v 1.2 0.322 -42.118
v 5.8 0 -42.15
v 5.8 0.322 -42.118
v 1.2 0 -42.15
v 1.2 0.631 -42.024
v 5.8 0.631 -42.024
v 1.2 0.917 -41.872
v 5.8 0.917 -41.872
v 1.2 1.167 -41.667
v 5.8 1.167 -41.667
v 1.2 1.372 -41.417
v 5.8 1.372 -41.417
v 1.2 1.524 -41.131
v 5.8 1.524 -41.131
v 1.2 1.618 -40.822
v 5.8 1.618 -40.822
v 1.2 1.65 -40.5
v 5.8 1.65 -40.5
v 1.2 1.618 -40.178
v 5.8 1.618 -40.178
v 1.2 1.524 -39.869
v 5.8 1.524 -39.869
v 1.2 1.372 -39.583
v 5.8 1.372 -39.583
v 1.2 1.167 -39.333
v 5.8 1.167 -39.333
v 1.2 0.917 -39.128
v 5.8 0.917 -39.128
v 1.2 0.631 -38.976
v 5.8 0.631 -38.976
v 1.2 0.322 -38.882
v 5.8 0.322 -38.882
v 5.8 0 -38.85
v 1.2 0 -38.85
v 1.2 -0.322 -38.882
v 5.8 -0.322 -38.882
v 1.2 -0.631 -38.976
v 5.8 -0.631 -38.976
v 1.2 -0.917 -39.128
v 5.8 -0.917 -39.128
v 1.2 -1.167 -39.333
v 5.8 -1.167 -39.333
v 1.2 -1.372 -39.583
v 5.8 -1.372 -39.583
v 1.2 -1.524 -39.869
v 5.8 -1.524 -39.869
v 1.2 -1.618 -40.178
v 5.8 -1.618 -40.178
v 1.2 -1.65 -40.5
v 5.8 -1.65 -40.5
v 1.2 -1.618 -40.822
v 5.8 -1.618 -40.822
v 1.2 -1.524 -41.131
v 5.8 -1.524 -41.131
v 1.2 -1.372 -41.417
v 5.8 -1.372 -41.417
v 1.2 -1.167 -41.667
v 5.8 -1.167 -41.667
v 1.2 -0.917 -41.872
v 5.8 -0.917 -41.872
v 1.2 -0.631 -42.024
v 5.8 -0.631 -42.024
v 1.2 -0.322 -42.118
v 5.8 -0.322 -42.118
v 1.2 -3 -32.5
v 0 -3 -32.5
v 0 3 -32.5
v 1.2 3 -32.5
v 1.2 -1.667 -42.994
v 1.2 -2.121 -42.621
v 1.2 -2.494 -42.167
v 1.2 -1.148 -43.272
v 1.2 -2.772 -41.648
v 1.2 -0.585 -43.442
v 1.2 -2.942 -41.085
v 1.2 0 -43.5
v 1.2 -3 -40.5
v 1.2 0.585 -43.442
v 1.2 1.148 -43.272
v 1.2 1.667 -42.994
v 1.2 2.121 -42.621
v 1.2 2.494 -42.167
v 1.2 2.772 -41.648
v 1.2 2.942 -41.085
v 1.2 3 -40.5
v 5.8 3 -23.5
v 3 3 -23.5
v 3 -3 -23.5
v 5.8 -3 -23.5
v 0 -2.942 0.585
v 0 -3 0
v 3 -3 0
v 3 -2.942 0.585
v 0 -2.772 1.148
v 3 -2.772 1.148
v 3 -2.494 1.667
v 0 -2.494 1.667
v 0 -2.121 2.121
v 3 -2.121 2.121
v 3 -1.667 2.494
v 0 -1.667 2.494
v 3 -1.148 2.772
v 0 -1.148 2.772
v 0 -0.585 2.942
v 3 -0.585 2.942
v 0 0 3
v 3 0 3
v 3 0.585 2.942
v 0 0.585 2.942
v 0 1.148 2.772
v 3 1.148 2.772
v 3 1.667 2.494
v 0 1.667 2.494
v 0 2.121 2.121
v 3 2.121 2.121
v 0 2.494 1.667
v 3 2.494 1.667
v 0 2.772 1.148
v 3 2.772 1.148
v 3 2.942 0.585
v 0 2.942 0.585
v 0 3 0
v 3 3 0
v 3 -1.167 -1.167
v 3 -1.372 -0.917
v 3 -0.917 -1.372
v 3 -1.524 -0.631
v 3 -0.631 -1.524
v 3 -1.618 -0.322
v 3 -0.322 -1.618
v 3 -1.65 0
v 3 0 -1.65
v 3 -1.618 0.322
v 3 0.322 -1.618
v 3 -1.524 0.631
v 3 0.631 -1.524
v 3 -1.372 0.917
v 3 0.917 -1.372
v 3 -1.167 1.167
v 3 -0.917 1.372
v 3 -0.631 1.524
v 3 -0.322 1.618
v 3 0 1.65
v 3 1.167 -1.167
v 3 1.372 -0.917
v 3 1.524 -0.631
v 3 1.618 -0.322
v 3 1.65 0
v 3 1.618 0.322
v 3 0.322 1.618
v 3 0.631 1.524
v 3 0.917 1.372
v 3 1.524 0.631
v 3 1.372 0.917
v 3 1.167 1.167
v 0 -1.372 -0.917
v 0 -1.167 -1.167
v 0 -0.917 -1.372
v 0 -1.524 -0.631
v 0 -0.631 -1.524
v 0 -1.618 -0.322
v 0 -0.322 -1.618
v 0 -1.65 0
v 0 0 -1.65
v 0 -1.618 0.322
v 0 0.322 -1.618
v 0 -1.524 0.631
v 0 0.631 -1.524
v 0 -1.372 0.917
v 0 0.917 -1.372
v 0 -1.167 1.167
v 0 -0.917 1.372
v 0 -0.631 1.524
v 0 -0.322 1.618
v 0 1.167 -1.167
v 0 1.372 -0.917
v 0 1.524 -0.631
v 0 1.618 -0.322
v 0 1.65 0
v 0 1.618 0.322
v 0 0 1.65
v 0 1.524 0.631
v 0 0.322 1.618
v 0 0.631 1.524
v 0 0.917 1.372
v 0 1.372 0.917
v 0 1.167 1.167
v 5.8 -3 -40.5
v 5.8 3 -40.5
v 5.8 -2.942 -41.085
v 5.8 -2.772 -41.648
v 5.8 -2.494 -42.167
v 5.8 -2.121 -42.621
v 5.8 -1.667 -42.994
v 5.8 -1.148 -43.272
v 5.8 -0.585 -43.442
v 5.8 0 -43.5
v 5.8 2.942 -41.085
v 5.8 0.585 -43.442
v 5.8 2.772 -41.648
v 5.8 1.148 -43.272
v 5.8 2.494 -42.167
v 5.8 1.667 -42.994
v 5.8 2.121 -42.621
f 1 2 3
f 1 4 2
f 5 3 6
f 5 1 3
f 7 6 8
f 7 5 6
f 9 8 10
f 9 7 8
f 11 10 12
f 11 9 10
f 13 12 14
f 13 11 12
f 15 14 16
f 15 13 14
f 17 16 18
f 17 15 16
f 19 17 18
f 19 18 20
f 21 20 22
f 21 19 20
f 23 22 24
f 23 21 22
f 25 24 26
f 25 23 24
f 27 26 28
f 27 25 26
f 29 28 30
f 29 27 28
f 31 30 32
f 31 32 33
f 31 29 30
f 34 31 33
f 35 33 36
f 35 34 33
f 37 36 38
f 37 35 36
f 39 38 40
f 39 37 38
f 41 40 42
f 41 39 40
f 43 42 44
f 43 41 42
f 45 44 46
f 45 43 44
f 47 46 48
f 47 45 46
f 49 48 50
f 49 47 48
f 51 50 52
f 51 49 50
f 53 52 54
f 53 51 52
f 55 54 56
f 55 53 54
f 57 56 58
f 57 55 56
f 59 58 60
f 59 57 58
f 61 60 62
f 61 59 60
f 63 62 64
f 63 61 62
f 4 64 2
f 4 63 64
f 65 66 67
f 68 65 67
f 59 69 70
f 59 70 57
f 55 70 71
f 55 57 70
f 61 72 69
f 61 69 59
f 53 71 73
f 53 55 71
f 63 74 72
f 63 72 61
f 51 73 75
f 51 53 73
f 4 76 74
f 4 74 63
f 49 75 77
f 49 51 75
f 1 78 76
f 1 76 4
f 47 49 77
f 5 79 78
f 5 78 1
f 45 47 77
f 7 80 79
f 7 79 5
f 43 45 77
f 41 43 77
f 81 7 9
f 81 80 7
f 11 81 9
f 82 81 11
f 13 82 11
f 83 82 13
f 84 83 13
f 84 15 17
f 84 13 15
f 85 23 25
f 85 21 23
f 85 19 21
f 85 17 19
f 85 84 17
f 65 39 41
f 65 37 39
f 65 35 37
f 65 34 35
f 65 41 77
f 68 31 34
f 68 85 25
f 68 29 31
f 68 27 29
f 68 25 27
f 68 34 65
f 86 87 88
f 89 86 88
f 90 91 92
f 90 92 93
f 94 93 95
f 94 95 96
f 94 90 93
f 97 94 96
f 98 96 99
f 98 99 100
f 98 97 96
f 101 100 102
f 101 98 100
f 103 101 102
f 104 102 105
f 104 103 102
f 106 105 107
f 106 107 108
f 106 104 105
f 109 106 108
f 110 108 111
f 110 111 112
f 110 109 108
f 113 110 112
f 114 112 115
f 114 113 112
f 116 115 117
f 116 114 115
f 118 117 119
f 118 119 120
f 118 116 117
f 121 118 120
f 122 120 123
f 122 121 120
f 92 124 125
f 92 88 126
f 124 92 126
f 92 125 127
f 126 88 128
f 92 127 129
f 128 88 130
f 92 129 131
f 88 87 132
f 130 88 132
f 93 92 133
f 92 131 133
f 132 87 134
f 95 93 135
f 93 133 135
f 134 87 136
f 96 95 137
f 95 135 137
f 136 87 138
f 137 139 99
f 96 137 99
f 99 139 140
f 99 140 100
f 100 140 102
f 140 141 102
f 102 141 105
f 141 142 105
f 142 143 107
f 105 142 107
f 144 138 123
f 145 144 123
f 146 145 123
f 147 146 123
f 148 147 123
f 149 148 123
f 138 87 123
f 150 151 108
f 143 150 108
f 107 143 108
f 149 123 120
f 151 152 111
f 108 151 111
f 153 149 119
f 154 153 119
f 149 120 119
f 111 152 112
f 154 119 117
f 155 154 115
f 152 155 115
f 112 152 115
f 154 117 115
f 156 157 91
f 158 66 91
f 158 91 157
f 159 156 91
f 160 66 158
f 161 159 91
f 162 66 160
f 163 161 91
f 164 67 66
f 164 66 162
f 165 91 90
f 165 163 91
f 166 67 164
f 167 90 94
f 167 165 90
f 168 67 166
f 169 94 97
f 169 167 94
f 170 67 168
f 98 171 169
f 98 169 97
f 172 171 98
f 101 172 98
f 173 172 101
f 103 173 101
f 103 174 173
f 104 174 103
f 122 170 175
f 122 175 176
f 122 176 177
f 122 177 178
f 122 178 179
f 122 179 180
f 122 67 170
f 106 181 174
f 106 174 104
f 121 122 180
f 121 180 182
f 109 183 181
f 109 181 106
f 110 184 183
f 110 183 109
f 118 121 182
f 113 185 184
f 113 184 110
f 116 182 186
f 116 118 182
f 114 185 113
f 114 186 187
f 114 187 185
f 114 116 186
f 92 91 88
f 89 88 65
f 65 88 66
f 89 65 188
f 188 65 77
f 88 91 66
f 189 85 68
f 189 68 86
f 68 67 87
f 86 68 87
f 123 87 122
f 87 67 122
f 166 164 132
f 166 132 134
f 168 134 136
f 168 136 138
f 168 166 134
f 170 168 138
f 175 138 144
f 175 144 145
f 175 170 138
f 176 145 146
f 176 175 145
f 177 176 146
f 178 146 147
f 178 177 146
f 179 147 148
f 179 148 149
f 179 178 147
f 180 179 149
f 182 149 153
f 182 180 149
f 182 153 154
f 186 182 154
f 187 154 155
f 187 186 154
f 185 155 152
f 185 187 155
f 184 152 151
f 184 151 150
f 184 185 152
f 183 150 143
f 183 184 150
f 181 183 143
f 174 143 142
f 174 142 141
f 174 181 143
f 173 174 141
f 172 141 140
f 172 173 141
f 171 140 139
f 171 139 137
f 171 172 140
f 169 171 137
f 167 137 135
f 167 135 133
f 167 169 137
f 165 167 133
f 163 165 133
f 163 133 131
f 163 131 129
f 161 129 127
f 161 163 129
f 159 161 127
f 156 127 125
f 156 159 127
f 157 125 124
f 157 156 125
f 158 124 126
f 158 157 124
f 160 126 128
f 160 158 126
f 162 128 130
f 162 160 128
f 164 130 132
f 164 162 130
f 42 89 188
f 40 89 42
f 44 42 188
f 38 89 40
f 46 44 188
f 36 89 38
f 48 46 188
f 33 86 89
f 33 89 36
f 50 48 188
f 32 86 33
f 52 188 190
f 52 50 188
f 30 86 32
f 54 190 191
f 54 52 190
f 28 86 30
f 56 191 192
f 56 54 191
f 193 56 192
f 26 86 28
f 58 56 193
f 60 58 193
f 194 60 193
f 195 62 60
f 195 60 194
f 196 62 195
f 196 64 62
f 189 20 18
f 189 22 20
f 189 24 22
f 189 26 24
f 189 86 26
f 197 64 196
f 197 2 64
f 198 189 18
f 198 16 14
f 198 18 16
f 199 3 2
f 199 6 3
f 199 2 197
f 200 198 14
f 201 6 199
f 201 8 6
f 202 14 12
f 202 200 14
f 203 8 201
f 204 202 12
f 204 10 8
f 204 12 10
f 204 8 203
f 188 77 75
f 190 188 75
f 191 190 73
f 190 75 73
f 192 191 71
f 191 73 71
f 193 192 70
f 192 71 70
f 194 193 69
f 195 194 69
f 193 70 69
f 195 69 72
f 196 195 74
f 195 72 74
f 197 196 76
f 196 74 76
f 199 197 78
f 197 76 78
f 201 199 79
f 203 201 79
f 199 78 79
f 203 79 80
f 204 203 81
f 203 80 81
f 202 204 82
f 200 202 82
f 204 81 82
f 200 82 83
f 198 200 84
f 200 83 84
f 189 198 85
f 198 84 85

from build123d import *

# Parameters (mm, degrees)
SKETCH1_R           = 1.65
BOSS_EXTRUDE1_DEPTH = 3
SKETCH3_W           = 11
SKETCH3_H           = 6
CUT_EXTRUDE2_DEPTH  = 1.2
SKETCH4_R           = 1.65
BOSS_EXTRUDE2_DEPTH = 2.8


with BuildPart() as part:
    # Sketch1 → Boss-Extrude1 (new body)
    with BuildSketch(Plane(origin=(0, 0, 0), x_dir=(0, 0, -1), z_dir=(1, 0, 0))):
        with BuildLine():
            Line((0, 3), (40.5, 3))
            ThreePointArc((40.5, 3), (43.5, 0), (40.5, -3))
            Line((40.5, -3), (0, -3))
            ThreePointArc((0, -3), (-3, 0), (0, 3))
        make_face()
        Circle(SKETCH1_R, mode=Mode.SUBTRACT)
        with Locations((40.5, 0)):
            Circle(SKETCH1_R, mode=Mode.SUBTRACT)
    extrude(amount=BOSS_EXTRUDE1_DEPTH)

    # Sketch3 → Cut-Extrude2 (cut)
    with BuildSketch(Plane.ZY):
        with Locations((-38, 0)):
            Rectangle(SKETCH3_W, SKETCH3_H)
    extrude(amount=-CUT_EXTRUDE2_DEPTH, mode=Mode.SUBTRACT)

    # Sketch4 → Boss-Extrude2 (add)
    with BuildSketch(Plane(origin=(3, 0, 0), x_dir=(0, 0, -1), z_dir=(1, 0, 0))):
        with BuildLine():
            Line((40.5, 3), (23.5, 3))
            Line((23.5, 3), (23.5, -3))
            Line((23.5, -3), (40.5, -3))
            ThreePointArc((40.5, -3), (43.5, 0), (40.5, 3))
        make_face()
        with Locations((40.5, 0)):
            Circle(SKETCH4_R, mode=Mode.SUBTRACT)
    extrude(amount=BOSS_EXTRUDE2_DEPTH)


solid = part.part
